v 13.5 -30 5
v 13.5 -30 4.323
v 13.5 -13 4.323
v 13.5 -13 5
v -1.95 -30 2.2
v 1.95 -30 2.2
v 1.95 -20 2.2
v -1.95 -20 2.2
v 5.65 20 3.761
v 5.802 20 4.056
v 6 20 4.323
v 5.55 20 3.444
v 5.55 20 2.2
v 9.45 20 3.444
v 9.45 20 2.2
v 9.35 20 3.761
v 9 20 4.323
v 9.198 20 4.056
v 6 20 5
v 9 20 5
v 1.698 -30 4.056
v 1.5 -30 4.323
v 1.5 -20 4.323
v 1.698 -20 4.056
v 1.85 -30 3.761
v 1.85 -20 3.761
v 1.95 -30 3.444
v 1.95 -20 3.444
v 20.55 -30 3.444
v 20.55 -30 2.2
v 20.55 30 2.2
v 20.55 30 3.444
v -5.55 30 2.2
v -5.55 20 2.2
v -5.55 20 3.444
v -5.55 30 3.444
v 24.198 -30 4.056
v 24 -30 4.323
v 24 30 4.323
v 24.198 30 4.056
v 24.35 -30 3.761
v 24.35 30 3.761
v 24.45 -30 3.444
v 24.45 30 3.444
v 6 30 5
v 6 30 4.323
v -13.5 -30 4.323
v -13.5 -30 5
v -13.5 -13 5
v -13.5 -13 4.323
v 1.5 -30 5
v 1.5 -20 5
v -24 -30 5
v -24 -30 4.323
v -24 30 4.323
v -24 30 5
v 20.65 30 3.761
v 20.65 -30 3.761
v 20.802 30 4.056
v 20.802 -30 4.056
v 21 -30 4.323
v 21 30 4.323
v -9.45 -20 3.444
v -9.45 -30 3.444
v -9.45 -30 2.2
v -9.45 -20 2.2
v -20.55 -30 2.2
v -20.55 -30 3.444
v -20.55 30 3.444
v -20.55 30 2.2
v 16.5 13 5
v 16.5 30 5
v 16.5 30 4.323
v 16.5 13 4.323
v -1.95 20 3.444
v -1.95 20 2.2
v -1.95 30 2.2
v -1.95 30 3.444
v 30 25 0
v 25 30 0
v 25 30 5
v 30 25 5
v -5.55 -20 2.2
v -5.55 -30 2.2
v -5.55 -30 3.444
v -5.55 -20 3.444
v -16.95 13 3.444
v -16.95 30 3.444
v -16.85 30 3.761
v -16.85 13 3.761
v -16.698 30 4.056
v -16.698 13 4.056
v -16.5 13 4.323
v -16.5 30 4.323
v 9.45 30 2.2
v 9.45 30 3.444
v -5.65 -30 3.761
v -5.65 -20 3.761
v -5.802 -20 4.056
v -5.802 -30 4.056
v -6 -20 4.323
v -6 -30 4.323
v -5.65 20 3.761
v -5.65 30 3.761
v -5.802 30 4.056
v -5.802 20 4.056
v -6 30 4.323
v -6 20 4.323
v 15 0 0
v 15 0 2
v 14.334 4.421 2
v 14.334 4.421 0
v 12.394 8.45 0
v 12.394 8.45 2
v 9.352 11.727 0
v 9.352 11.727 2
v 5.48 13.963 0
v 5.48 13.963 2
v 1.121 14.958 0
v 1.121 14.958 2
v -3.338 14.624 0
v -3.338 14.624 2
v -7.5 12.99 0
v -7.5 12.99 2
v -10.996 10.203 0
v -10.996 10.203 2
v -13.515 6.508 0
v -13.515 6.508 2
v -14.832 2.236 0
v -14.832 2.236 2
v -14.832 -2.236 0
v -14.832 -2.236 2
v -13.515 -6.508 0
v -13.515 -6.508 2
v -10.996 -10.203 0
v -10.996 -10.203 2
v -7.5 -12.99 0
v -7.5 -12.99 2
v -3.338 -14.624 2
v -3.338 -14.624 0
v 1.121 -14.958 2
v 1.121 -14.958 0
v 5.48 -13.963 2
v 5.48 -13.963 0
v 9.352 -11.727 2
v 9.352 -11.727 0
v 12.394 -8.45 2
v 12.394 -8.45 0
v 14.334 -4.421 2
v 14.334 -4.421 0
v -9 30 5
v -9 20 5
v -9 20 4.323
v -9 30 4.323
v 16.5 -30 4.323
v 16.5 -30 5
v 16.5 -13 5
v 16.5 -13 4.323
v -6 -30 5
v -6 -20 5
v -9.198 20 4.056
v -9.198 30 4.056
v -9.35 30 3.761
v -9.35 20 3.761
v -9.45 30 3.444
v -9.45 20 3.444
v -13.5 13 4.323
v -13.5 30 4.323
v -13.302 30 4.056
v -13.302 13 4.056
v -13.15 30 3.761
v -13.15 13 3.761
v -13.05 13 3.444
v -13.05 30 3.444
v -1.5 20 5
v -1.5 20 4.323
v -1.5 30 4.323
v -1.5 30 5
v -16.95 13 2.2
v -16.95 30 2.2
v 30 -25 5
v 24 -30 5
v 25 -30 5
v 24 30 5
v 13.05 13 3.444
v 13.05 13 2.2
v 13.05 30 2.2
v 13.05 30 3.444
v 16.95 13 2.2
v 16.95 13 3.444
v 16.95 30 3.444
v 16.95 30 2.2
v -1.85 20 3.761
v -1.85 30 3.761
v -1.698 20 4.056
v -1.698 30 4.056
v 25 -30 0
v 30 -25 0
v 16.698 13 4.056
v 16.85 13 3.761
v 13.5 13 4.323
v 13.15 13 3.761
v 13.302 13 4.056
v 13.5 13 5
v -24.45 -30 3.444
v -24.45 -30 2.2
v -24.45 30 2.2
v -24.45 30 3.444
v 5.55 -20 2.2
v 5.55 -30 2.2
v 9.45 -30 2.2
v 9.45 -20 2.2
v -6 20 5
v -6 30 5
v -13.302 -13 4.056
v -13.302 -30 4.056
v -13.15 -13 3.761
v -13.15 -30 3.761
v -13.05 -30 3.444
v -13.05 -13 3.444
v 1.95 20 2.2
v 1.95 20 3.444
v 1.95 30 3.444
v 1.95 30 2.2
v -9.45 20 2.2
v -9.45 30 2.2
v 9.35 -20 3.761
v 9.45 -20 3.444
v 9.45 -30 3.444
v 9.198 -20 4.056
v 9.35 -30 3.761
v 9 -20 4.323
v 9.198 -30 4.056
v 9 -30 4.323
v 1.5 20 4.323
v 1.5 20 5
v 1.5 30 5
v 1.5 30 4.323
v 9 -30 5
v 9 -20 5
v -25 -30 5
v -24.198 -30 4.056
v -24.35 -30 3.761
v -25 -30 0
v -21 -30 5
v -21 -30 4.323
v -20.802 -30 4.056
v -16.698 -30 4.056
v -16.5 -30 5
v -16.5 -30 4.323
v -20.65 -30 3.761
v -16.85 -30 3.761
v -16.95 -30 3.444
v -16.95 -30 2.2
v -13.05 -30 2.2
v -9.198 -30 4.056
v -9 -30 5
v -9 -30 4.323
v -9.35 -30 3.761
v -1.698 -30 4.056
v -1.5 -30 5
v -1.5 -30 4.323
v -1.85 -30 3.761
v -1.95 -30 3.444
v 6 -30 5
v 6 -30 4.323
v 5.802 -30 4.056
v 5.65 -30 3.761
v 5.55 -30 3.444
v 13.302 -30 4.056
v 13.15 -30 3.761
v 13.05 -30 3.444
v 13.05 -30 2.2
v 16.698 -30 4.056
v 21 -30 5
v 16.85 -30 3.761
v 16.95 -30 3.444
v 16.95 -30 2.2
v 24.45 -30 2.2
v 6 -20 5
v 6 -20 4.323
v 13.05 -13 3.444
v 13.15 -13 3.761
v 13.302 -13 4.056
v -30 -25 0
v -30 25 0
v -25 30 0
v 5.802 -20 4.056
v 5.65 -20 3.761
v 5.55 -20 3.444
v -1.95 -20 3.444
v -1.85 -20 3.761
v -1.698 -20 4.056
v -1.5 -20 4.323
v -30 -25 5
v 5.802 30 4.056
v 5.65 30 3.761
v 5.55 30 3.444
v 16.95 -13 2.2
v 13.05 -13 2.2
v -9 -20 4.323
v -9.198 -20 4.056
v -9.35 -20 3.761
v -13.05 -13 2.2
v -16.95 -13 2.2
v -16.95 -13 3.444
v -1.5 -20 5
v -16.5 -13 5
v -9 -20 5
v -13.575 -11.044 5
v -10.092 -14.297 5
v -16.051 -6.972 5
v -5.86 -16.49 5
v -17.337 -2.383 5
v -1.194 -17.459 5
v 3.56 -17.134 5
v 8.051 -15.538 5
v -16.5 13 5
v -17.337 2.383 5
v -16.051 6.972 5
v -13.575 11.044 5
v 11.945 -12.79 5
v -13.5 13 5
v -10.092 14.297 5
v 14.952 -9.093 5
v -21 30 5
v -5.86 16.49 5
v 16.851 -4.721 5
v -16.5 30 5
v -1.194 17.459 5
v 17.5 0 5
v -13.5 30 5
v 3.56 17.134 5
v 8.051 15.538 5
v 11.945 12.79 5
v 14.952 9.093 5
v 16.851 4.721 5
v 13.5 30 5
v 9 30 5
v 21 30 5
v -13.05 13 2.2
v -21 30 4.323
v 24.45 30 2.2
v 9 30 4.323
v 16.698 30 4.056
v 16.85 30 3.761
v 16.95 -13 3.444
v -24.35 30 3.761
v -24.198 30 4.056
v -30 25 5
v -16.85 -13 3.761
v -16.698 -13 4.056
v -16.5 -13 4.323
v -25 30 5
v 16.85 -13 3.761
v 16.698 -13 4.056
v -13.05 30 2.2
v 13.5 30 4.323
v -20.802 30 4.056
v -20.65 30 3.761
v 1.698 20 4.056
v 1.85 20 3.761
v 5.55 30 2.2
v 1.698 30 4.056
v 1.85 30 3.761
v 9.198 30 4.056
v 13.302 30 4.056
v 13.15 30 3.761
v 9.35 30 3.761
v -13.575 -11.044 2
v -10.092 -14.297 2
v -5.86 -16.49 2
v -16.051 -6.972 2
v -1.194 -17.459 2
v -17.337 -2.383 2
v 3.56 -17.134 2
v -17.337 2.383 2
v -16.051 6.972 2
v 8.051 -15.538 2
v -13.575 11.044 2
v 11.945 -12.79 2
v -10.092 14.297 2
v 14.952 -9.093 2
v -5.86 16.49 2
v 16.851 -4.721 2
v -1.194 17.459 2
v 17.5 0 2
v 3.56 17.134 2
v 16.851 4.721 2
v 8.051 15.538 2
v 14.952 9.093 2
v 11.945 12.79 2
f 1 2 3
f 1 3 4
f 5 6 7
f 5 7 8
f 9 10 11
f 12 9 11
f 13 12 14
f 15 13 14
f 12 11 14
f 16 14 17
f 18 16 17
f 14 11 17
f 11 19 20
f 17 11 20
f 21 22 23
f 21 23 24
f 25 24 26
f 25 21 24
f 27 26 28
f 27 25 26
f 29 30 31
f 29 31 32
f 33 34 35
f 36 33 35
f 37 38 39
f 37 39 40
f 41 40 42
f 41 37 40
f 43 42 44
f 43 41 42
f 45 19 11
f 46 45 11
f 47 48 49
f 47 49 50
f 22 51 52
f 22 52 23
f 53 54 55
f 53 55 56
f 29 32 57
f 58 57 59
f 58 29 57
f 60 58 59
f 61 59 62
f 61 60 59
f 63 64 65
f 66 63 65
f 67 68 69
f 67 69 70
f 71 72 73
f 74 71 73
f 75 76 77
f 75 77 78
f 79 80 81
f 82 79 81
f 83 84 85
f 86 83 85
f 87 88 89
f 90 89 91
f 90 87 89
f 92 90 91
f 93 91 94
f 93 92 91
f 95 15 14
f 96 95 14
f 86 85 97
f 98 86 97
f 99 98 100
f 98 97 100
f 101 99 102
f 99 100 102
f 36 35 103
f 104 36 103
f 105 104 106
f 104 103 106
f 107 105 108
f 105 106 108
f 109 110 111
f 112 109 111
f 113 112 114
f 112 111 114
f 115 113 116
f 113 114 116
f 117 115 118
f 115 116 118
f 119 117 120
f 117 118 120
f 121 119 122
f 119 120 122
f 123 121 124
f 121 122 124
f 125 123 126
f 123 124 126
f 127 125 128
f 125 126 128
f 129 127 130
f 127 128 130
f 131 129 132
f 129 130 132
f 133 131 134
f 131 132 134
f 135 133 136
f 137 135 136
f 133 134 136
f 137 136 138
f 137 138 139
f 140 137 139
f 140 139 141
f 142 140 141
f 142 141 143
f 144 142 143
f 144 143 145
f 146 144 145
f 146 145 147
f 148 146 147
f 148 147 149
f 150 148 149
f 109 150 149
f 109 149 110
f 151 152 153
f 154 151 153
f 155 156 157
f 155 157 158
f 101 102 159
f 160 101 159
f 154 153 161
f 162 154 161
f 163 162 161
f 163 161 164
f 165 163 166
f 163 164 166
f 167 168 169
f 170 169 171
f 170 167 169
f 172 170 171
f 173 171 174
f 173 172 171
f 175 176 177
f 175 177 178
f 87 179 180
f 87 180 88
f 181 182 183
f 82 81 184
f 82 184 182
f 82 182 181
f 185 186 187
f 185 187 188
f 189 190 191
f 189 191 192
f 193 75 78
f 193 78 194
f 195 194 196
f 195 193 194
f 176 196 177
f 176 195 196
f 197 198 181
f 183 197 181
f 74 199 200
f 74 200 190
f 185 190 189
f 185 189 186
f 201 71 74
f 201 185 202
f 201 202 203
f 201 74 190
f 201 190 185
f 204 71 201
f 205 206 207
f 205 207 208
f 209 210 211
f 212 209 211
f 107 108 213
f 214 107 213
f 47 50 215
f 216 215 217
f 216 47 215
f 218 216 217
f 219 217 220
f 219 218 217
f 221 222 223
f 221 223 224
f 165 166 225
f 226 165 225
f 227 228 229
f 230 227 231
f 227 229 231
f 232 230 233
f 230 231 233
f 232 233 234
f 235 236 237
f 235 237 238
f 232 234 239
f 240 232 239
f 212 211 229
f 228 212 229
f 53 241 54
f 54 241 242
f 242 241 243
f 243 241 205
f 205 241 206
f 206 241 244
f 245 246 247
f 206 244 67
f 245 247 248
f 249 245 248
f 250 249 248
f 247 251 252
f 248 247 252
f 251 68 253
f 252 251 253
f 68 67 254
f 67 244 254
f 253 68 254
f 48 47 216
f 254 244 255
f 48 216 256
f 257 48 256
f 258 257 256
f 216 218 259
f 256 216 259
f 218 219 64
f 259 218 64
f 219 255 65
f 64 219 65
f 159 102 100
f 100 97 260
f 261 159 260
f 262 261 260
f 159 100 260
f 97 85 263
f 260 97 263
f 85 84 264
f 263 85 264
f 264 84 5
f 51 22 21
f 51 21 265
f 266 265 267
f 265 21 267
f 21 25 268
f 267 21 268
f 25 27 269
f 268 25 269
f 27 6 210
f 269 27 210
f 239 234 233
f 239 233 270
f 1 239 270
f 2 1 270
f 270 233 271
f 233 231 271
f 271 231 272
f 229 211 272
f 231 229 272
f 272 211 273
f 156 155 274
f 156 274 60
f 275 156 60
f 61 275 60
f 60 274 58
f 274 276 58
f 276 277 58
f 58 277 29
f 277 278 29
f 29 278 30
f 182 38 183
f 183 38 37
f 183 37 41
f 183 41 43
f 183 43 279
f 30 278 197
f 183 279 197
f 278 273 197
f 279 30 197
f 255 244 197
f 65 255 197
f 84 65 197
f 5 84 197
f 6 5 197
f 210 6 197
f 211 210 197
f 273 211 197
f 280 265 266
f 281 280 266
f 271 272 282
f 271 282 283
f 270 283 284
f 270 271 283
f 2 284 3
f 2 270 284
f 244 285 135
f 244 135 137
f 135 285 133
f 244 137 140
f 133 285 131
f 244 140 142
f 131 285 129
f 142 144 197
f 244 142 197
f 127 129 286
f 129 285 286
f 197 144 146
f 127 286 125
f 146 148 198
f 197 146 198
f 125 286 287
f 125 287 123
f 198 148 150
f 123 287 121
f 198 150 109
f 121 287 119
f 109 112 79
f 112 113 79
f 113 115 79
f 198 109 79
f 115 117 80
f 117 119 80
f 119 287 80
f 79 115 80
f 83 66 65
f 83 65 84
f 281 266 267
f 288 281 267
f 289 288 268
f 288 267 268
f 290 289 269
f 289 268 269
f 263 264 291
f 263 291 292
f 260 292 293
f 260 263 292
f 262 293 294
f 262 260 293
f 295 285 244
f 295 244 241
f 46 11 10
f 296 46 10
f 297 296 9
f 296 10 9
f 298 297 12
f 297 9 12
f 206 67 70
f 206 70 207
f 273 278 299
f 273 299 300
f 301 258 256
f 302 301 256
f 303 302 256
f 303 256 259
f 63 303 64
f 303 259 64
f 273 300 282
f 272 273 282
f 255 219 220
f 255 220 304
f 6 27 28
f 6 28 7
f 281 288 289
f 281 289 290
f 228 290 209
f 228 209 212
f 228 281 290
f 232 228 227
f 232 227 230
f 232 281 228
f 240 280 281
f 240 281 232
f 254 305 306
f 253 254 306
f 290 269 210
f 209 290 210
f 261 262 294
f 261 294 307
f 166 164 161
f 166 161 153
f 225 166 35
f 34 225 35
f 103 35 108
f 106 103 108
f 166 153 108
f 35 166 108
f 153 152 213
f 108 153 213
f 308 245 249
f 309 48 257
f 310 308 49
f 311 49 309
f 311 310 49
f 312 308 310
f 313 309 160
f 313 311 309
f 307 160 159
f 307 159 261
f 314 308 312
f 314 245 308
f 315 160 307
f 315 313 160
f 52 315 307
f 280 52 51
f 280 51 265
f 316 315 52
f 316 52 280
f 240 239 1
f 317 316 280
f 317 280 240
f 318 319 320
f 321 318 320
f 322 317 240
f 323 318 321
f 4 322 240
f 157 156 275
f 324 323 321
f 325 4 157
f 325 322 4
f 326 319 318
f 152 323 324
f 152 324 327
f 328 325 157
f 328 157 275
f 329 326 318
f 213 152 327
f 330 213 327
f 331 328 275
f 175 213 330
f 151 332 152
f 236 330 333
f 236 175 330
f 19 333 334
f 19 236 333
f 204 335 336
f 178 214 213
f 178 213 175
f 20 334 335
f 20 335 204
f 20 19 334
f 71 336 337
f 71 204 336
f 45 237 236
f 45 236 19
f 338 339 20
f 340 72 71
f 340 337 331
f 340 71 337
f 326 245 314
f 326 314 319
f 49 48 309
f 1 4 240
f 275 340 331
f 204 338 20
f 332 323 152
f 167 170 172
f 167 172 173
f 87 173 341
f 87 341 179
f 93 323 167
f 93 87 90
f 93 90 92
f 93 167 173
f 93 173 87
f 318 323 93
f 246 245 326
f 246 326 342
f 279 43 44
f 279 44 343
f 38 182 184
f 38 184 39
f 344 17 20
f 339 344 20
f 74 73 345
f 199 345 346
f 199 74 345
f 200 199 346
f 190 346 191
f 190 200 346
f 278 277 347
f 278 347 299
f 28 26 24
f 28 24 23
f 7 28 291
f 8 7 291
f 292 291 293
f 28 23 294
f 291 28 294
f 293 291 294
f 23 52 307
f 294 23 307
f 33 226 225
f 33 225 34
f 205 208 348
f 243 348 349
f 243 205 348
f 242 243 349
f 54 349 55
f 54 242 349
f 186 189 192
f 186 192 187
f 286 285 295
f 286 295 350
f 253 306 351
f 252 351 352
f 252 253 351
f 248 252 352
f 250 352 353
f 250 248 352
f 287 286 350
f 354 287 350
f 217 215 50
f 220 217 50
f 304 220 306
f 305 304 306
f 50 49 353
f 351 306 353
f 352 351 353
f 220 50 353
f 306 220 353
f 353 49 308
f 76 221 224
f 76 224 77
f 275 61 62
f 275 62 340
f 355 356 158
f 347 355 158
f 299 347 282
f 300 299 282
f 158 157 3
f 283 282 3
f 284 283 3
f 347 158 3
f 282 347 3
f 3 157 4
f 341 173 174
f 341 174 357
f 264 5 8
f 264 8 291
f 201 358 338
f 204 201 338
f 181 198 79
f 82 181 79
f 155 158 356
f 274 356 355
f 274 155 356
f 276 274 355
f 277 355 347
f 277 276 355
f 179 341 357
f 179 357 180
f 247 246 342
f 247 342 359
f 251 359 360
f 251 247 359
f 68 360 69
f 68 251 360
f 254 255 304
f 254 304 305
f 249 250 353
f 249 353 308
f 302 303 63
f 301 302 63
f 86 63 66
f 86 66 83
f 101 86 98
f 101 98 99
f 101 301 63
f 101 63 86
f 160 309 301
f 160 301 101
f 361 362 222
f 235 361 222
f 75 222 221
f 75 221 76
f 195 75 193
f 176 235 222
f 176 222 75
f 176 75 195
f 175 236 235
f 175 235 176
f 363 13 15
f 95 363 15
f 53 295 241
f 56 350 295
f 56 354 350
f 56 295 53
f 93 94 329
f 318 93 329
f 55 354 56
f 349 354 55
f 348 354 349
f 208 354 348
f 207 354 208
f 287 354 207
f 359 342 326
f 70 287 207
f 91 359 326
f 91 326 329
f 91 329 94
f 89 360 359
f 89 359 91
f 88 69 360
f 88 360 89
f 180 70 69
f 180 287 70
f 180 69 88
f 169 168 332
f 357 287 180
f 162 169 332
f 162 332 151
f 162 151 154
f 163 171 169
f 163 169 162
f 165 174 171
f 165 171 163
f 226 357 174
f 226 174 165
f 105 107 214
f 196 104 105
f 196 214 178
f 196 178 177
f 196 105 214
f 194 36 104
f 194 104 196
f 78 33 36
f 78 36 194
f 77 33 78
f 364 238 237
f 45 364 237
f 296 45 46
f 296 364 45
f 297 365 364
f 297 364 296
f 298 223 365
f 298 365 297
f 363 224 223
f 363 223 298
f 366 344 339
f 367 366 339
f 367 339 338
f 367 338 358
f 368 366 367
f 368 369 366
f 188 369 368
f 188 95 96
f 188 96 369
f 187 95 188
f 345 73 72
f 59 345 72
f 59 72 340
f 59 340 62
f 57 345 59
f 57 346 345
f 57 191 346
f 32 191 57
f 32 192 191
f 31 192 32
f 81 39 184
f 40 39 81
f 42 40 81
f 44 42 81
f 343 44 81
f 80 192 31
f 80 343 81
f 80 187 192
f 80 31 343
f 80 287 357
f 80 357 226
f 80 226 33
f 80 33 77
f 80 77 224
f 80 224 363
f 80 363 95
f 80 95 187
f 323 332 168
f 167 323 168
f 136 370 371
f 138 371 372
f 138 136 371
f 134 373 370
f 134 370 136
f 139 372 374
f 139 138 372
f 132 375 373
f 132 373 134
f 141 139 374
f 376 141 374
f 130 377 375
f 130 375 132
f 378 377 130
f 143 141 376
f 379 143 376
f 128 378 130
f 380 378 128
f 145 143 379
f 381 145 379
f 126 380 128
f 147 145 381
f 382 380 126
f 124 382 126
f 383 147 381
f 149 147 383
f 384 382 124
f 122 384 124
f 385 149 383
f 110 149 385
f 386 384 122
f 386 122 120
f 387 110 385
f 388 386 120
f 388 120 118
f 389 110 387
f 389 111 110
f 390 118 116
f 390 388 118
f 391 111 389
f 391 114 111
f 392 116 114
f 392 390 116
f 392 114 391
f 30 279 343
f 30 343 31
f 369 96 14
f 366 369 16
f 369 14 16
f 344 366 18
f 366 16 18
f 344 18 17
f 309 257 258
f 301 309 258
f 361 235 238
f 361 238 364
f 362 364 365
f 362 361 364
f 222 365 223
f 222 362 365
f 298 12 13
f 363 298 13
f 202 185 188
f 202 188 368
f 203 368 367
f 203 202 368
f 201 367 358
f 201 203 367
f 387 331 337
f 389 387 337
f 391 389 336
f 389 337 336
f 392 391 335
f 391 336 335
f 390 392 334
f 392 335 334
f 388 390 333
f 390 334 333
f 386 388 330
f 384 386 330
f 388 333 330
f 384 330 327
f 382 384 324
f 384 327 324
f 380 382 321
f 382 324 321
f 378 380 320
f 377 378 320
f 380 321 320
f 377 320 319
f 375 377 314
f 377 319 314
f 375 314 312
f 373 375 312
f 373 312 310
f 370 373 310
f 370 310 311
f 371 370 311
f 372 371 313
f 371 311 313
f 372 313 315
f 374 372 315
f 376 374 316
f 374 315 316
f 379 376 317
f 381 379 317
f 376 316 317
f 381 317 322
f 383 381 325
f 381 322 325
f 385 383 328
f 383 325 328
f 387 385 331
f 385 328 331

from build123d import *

# Parameters (mm, degrees)
SKETCH_1_R          = 45
EXTRUDE_1_DEPTH     = 5
SKETCH_2_W          = 60
SKETCH_2_H          = 60
EXTRUDE_2_DEPTH     = 5
CUT_EXTRUDE_1_DEPTH = 10
CUT_EXTRUDE_START   = -50
CUT_EXTRUDE_2_DEPTH = 10
CUT_EXTRUDE_3_DEPTH = 17
CUT_EXTRUDE_START_2 = -43
CUT_EXTRUDE_4_DEPTH = 17
CUT_EXTRUDE_5_REACH = 89.607
CHAMFER_1_SIZE      = 5
SKETCH_6_R          = 17.5
CUT_EXTRUDE_6_DEPTH = 3
SKETCH_7_R          = 15
CUT_EXTRUDE_7_DEPTH = 65.02343321
SKETCH_8_R          = 45
CUT_EXTRUDE_9_DEPTH = 10


with BuildPart() as part:
    # 草图1 → 凸台-拉伸1 (new body)
    with BuildSketch(Plane.XY):
        Circle(SKETCH_1_R)
    extrude(amount=-EXTRUDE_1_DEPTH)

    # 草图2 → 凸台-拉伸2 (add)
    with BuildSketch(Plane.XY):
        Rectangle(SKETCH_2_W, SKETCH_2_H)
    extrude(amount=EXTRUDE_2_DEPTH)

    # 草图3 → 切除-拉伸1 (cut)
    with BuildSketch(Plane.XZ.offset(30)):
        with BuildLine():
            Line((-1.5, 5), (1.5, 5))
            Line((1.5, 5), (1.5, 4.322875656))
            ThreePointArc((1.5, 4.322875656), (1.780042303, 3.911838473), (1.95, 3.444409721))
            Line((1.95, 3.444409721), (1.95, 2.2))
            Line((1.95, 2.2), (-1.95, 2.2))
            Line((-1.95, 2.2), (-1.95, 3.444409721))
            ThreePointArc((-1.95, 3.444409721), (-1.780042303, 3.911838473), (-1.5, 4.322875656))
            Line((-1.5, 4.322875656), (-1.5, 5))
        make_face()
        with BuildLine():
            Line((6, 5), (6, 4.322875656))
            ThreePointArc((6, 4.322875656), (5.719957697, 3.911838473), (5.55, 3.444409721))
            Line((5.55, 3.444409721), (5.55, 2.2))
            Line((5.55, 2.2), (9.45, 2.2))
            Line((9.45, 2.2), (9.45, 3.444409721))
            ThreePointArc((9.45, 3.444409721), (9.280042303, 3.911838473), (9, 4.322875656))
            Line((9, 4.322875656), (9, 5))
            Line((9, 5), (6, 5))
        make_face()
        with BuildLine():
            Line((-9, 5), (-9, 4.322875656))
            ThreePointArc((-9, 4.322875656), (-9.280042303, 3.911838473), (-9.45, 3.444409721))
            Line((-9.45, 3.444409721), (-9.45, 2.2))
            Line((-9.45, 2.2), (-5.55, 2.2))
            Line((-5.55, 2.2), (-5.55, 3.444409721))
            ThreePointArc((-5.55, 3.444409721), (-5.719957697, 3.911838473), (-6, 4.322875656))
            Line((-6, 4.322875656), (-6, 5))
            Line((-6, 5), (-9, 5))
        make_face()
    extrude(amount=-CUT_EXTRUDE_1_DEPTH, mode=Mode.SUBTRACT)

    # 草图3<2> → 切除-拉伸2 (cut)
    with BuildSketch(Plane.XZ.offset(30).offset(CUT_EXTRUDE_START)):
        with BuildLine():
            Line((-1.5, 5), (1.5, 5))
            Line((1.5, 5), (1.5, 4.322875656))
            ThreePointArc((1.5, 4.322875656), (1.780042303, 3.911838473), (1.95, 3.444409721))
            Line((1.95, 3.444409721), (1.95, 2.2))
            Line((1.95, 2.2), (-1.95, 2.2))
            Line((-1.95, 2.2), (-1.95, 3.444409721))
            ThreePointArc((-1.95, 3.444409721), (-1.780042303, 3.911838473), (-1.5, 4.322875656))
            Line((-1.5, 4.322875656), (-1.5, 5))
        make_face()
        with BuildLine():
            Line((6, 5), (6, 4.322875656))
            ThreePointArc((6, 4.322875656), (5.719957697, 3.911838473), (5.55, 3.444409721))
            Line((5.55, 3.444409721), (5.55, 2.2))
            Line((5.55, 2.2), (9.45, 2.2))
            Line((9.45, 2.2), (9.45, 3.444409721))
            ThreePointArc((9.45, 3.444409721), (9.280042303, 3.911838473), (9, 4.322875656))
            Line((9, 4.322875656), (9, 5))
            Line((9, 5), (6, 5))
        make_face()
        with BuildLine():
            Line((-9, 5), (-9, 4.322875656))
            ThreePointArc((-9, 4.322875656), (-9.280042303, 3.911838473), (-9.45, 3.444409721))
            Line((-9.45, 3.444409721), (-9.45, 2.2))
            Line((-9.45, 2.2), (-5.55, 2.2))
            Line((-5.55, 2.2), (-5.55, 3.444409721))
            ThreePointArc((-5.55, 3.444409721), (-5.719957697, 3.911838473), (-6, 4.322875656))
            Line((-6, 4.322875656), (-6, 5))
            Line((-6, 5), (-9, 5))
        make_face()
    extrude(amount=-CUT_EXTRUDE_2_DEPTH, mode=Mode.SUBTRACT)

    # 草图4 → 切除-拉伸3 (cut)
    with BuildSketch(Plane.XZ.offset(30)):
        with BuildLine():
            Line((-16.5, 5), (-13.5, 5))
            Line((-13.5, 5), (-13.5, 4.322875656))
            ThreePointArc((-13.5, 4.322875656), (-13.219957697, 3.911838473), (-13.05, 3.444409721))
            Line((-13.05, 3.444409721), (-13.05, 2.2))
            Line((-13.05, 2.2), (-16.95, 2.2))
            Line((-16.95, 2.2), (-16.95, 3.444409721))
            ThreePointArc((-16.95, 3.444409721), (-16.780042303, 3.911838473), (-16.5, 4.322875656))
            Line((-16.5, 4.322875656), (-16.5, 5))
        make_face()
        with BuildLine():
            Line((13.5, 5), (16.5, 5))
            Line((16.5, 5), (16.5, 4.322875656))
            ThreePointArc((16.5, 4.322875656), (16.780042303, 3.911838473), (16.95, 3.444409721))
            Line((16.95, 3.444409721), (16.95, 2.2))
            Line((16.95, 2.2), (13.05, 2.2))
            Line((13.05, 2.2), (13.05, 3.444409721))
            ThreePointArc((13.05, 3.444409721), (13.219957697, 3.911838473), (13.5, 4.322875656))
            Line((13.5, 4.322875656), (13.5, 5))
        make_face()
    extrude(amount=-CUT_EXTRUDE_3_DEPTH, mode=Mode.SUBTRACT)

    # 草图4<2> → 切除-拉伸4 (cut)
    with BuildSketch(Plane.XZ.offset(30).offset(CUT_EXTRUDE_START_2)):
        with BuildLine():
            Line((-16.5, 5), (-13.5, 5))
            Line((-13.5, 5), (-13.5, 4.322875656))
            ThreePointArc((-13.5, 4.322875656), (-13.219957697, 3.911838473), (-13.05, 3.444409721))
            Line((-13.05, 3.444409721), (-13.05, 2.2))
            Line((-13.05, 2.2), (-16.95, 2.2))
            Line((-16.95, 2.2), (-16.95, 3.444409721))
            ThreePointArc((-16.95, 3.444409721), (-16.780042303, 3.911838473), (-16.5, 4.322875656))
            Line((-16.5, 4.322875656), (-16.5, 5))
        make_face()
        with BuildLine():
            Line((13.5, 5), (16.5, 5))
            Line((16.5, 5), (16.5, 4.322875656))
            ThreePointArc((16.5, 4.322875656), (16.780042303, 3.911838473), (16.95, 3.444409721))
            Line((16.95, 3.444409721), (16.95, 2.2))
            Line((16.95, 2.2), (13.05, 2.2))
            Line((13.05, 2.2), (13.05, 3.444409721))
            ThreePointArc((13.05, 3.444409721), (13.219957697, 3.911838473), (13.5, 4.322875656))
            Line((13.5, 4.322875656), (13.5, 5))
        make_face()
    extrude(amount=-CUT_EXTRUDE_4_DEPTH, mode=Mode.SUBTRACT)

    # 草图5 → 切除-拉伸5 (cut, up to next)
    with BuildSketch(Plane.XZ.offset(30), mode=Mode.PRIVATE) as cut_extrude_5_sk1:
        with BuildLine():
            Line((-21, 5), (-21, 4.322875656))
            ThreePointArc((-21, 4.322875656), (-20.719957697, 3.911838473), (-20.55, 3.444409721))
            Line((-20.55, 3.444409721), (-20.55, 2.2))
            Line((-20.55, 2.2), (-24.45, 2.2))
            Line((-24.45, 2.2), (-24.45, 3.444409721))
            ThreePointArc((-24.45, 3.444409721), (-24.280042303, 3.911838473), (-24, 4.322875656))
            Line((-24, 4.322875656), (-24, 5))
            Line((-24, 5), (-21, 5))
        make_face()
    cut_extrude_5_tool1 = extrude(cut_extrude_5_sk1.sketch, amount=-CUT_EXTRUDE_5_REACH, mode=Mode.PRIVATE) & part.part
    # 草图5 → 切除-拉伸5 (cut, up to next)
    with BuildSketch(Plane.XZ.offset(30), mode=Mode.PRIVATE) as cut_extrude_5_sk2:
        with BuildLine():
            Line((24, 5), (24, 4.322875656))
            ThreePointArc((24, 4.322875656), (24.280042303, 3.911838473), (24.45, 3.444409721))
            Line((24.45, 3.444409721), (24.45, 2.2))
            Line((24.45, 2.2), (20.55, 2.2))
            Line((20.55, 2.2), (20.55, 3.444409721))
            ThreePointArc((20.55, 3.444409721), (20.719957697, 3.911838473), (21, 4.322875656))
            Line((21, 4.322875656), (21, 5))
            Line((21, 5), (24, 5))
        make_face()
    cut_extrude_5_tool2 = extrude(cut_extrude_5_sk2.sketch, amount=-CUT_EXTRUDE_5_REACH, mode=Mode.PRIVATE) & part.part
    add(cut_extrude_5_tool1.solids().sort_by_distance((-22.5, -30, 3.520698))[0], mode=Mode.SUBTRACT)
    add(cut_extrude_5_tool2.solids().sort_by_distance((22.5, -30, 3.520698))[0], mode=Mode.SUBTRACT)

    # 倒角1
    chamfer_1_edges = [part.edges().sort_by_distance(p)[0] for p in [
        (-30, 30, 2.5),
        (-30, -30, 2.5),
        (30, -30, 2.5),
        (30, 30, 2.5),
    ]]
    chamfer(chamfer_1_edges, length=CHAMFER_1_SIZE)

    # 草图6 → 切除-拉伸6 (cut)
    with BuildSketch(Plane.XY.offset(5)):
        Circle(SKETCH_6_R)
    extrude(amount=-CUT_EXTRUDE_6_DEPTH, mode=Mode.SUBTRACT)

    # 草图7 → 切除-拉伸7 (cut, through all)
    with BuildSketch(Plane.XY.offset(2)):
        Circle(SKETCH_7_R)
    extrude(amount=-CUT_EXTRUDE_7_DEPTH, mode=Mode.SUBTRACT)

    # 草图8 → 切除-拉伸9 (cut)
    with BuildSketch(Plane.XY):
        Circle(SKETCH_8_R)
    extrude(amount=-CUT_EXTRUDE_9_DEPTH, mode=Mode.SUBTRACT)


solid = part.part
